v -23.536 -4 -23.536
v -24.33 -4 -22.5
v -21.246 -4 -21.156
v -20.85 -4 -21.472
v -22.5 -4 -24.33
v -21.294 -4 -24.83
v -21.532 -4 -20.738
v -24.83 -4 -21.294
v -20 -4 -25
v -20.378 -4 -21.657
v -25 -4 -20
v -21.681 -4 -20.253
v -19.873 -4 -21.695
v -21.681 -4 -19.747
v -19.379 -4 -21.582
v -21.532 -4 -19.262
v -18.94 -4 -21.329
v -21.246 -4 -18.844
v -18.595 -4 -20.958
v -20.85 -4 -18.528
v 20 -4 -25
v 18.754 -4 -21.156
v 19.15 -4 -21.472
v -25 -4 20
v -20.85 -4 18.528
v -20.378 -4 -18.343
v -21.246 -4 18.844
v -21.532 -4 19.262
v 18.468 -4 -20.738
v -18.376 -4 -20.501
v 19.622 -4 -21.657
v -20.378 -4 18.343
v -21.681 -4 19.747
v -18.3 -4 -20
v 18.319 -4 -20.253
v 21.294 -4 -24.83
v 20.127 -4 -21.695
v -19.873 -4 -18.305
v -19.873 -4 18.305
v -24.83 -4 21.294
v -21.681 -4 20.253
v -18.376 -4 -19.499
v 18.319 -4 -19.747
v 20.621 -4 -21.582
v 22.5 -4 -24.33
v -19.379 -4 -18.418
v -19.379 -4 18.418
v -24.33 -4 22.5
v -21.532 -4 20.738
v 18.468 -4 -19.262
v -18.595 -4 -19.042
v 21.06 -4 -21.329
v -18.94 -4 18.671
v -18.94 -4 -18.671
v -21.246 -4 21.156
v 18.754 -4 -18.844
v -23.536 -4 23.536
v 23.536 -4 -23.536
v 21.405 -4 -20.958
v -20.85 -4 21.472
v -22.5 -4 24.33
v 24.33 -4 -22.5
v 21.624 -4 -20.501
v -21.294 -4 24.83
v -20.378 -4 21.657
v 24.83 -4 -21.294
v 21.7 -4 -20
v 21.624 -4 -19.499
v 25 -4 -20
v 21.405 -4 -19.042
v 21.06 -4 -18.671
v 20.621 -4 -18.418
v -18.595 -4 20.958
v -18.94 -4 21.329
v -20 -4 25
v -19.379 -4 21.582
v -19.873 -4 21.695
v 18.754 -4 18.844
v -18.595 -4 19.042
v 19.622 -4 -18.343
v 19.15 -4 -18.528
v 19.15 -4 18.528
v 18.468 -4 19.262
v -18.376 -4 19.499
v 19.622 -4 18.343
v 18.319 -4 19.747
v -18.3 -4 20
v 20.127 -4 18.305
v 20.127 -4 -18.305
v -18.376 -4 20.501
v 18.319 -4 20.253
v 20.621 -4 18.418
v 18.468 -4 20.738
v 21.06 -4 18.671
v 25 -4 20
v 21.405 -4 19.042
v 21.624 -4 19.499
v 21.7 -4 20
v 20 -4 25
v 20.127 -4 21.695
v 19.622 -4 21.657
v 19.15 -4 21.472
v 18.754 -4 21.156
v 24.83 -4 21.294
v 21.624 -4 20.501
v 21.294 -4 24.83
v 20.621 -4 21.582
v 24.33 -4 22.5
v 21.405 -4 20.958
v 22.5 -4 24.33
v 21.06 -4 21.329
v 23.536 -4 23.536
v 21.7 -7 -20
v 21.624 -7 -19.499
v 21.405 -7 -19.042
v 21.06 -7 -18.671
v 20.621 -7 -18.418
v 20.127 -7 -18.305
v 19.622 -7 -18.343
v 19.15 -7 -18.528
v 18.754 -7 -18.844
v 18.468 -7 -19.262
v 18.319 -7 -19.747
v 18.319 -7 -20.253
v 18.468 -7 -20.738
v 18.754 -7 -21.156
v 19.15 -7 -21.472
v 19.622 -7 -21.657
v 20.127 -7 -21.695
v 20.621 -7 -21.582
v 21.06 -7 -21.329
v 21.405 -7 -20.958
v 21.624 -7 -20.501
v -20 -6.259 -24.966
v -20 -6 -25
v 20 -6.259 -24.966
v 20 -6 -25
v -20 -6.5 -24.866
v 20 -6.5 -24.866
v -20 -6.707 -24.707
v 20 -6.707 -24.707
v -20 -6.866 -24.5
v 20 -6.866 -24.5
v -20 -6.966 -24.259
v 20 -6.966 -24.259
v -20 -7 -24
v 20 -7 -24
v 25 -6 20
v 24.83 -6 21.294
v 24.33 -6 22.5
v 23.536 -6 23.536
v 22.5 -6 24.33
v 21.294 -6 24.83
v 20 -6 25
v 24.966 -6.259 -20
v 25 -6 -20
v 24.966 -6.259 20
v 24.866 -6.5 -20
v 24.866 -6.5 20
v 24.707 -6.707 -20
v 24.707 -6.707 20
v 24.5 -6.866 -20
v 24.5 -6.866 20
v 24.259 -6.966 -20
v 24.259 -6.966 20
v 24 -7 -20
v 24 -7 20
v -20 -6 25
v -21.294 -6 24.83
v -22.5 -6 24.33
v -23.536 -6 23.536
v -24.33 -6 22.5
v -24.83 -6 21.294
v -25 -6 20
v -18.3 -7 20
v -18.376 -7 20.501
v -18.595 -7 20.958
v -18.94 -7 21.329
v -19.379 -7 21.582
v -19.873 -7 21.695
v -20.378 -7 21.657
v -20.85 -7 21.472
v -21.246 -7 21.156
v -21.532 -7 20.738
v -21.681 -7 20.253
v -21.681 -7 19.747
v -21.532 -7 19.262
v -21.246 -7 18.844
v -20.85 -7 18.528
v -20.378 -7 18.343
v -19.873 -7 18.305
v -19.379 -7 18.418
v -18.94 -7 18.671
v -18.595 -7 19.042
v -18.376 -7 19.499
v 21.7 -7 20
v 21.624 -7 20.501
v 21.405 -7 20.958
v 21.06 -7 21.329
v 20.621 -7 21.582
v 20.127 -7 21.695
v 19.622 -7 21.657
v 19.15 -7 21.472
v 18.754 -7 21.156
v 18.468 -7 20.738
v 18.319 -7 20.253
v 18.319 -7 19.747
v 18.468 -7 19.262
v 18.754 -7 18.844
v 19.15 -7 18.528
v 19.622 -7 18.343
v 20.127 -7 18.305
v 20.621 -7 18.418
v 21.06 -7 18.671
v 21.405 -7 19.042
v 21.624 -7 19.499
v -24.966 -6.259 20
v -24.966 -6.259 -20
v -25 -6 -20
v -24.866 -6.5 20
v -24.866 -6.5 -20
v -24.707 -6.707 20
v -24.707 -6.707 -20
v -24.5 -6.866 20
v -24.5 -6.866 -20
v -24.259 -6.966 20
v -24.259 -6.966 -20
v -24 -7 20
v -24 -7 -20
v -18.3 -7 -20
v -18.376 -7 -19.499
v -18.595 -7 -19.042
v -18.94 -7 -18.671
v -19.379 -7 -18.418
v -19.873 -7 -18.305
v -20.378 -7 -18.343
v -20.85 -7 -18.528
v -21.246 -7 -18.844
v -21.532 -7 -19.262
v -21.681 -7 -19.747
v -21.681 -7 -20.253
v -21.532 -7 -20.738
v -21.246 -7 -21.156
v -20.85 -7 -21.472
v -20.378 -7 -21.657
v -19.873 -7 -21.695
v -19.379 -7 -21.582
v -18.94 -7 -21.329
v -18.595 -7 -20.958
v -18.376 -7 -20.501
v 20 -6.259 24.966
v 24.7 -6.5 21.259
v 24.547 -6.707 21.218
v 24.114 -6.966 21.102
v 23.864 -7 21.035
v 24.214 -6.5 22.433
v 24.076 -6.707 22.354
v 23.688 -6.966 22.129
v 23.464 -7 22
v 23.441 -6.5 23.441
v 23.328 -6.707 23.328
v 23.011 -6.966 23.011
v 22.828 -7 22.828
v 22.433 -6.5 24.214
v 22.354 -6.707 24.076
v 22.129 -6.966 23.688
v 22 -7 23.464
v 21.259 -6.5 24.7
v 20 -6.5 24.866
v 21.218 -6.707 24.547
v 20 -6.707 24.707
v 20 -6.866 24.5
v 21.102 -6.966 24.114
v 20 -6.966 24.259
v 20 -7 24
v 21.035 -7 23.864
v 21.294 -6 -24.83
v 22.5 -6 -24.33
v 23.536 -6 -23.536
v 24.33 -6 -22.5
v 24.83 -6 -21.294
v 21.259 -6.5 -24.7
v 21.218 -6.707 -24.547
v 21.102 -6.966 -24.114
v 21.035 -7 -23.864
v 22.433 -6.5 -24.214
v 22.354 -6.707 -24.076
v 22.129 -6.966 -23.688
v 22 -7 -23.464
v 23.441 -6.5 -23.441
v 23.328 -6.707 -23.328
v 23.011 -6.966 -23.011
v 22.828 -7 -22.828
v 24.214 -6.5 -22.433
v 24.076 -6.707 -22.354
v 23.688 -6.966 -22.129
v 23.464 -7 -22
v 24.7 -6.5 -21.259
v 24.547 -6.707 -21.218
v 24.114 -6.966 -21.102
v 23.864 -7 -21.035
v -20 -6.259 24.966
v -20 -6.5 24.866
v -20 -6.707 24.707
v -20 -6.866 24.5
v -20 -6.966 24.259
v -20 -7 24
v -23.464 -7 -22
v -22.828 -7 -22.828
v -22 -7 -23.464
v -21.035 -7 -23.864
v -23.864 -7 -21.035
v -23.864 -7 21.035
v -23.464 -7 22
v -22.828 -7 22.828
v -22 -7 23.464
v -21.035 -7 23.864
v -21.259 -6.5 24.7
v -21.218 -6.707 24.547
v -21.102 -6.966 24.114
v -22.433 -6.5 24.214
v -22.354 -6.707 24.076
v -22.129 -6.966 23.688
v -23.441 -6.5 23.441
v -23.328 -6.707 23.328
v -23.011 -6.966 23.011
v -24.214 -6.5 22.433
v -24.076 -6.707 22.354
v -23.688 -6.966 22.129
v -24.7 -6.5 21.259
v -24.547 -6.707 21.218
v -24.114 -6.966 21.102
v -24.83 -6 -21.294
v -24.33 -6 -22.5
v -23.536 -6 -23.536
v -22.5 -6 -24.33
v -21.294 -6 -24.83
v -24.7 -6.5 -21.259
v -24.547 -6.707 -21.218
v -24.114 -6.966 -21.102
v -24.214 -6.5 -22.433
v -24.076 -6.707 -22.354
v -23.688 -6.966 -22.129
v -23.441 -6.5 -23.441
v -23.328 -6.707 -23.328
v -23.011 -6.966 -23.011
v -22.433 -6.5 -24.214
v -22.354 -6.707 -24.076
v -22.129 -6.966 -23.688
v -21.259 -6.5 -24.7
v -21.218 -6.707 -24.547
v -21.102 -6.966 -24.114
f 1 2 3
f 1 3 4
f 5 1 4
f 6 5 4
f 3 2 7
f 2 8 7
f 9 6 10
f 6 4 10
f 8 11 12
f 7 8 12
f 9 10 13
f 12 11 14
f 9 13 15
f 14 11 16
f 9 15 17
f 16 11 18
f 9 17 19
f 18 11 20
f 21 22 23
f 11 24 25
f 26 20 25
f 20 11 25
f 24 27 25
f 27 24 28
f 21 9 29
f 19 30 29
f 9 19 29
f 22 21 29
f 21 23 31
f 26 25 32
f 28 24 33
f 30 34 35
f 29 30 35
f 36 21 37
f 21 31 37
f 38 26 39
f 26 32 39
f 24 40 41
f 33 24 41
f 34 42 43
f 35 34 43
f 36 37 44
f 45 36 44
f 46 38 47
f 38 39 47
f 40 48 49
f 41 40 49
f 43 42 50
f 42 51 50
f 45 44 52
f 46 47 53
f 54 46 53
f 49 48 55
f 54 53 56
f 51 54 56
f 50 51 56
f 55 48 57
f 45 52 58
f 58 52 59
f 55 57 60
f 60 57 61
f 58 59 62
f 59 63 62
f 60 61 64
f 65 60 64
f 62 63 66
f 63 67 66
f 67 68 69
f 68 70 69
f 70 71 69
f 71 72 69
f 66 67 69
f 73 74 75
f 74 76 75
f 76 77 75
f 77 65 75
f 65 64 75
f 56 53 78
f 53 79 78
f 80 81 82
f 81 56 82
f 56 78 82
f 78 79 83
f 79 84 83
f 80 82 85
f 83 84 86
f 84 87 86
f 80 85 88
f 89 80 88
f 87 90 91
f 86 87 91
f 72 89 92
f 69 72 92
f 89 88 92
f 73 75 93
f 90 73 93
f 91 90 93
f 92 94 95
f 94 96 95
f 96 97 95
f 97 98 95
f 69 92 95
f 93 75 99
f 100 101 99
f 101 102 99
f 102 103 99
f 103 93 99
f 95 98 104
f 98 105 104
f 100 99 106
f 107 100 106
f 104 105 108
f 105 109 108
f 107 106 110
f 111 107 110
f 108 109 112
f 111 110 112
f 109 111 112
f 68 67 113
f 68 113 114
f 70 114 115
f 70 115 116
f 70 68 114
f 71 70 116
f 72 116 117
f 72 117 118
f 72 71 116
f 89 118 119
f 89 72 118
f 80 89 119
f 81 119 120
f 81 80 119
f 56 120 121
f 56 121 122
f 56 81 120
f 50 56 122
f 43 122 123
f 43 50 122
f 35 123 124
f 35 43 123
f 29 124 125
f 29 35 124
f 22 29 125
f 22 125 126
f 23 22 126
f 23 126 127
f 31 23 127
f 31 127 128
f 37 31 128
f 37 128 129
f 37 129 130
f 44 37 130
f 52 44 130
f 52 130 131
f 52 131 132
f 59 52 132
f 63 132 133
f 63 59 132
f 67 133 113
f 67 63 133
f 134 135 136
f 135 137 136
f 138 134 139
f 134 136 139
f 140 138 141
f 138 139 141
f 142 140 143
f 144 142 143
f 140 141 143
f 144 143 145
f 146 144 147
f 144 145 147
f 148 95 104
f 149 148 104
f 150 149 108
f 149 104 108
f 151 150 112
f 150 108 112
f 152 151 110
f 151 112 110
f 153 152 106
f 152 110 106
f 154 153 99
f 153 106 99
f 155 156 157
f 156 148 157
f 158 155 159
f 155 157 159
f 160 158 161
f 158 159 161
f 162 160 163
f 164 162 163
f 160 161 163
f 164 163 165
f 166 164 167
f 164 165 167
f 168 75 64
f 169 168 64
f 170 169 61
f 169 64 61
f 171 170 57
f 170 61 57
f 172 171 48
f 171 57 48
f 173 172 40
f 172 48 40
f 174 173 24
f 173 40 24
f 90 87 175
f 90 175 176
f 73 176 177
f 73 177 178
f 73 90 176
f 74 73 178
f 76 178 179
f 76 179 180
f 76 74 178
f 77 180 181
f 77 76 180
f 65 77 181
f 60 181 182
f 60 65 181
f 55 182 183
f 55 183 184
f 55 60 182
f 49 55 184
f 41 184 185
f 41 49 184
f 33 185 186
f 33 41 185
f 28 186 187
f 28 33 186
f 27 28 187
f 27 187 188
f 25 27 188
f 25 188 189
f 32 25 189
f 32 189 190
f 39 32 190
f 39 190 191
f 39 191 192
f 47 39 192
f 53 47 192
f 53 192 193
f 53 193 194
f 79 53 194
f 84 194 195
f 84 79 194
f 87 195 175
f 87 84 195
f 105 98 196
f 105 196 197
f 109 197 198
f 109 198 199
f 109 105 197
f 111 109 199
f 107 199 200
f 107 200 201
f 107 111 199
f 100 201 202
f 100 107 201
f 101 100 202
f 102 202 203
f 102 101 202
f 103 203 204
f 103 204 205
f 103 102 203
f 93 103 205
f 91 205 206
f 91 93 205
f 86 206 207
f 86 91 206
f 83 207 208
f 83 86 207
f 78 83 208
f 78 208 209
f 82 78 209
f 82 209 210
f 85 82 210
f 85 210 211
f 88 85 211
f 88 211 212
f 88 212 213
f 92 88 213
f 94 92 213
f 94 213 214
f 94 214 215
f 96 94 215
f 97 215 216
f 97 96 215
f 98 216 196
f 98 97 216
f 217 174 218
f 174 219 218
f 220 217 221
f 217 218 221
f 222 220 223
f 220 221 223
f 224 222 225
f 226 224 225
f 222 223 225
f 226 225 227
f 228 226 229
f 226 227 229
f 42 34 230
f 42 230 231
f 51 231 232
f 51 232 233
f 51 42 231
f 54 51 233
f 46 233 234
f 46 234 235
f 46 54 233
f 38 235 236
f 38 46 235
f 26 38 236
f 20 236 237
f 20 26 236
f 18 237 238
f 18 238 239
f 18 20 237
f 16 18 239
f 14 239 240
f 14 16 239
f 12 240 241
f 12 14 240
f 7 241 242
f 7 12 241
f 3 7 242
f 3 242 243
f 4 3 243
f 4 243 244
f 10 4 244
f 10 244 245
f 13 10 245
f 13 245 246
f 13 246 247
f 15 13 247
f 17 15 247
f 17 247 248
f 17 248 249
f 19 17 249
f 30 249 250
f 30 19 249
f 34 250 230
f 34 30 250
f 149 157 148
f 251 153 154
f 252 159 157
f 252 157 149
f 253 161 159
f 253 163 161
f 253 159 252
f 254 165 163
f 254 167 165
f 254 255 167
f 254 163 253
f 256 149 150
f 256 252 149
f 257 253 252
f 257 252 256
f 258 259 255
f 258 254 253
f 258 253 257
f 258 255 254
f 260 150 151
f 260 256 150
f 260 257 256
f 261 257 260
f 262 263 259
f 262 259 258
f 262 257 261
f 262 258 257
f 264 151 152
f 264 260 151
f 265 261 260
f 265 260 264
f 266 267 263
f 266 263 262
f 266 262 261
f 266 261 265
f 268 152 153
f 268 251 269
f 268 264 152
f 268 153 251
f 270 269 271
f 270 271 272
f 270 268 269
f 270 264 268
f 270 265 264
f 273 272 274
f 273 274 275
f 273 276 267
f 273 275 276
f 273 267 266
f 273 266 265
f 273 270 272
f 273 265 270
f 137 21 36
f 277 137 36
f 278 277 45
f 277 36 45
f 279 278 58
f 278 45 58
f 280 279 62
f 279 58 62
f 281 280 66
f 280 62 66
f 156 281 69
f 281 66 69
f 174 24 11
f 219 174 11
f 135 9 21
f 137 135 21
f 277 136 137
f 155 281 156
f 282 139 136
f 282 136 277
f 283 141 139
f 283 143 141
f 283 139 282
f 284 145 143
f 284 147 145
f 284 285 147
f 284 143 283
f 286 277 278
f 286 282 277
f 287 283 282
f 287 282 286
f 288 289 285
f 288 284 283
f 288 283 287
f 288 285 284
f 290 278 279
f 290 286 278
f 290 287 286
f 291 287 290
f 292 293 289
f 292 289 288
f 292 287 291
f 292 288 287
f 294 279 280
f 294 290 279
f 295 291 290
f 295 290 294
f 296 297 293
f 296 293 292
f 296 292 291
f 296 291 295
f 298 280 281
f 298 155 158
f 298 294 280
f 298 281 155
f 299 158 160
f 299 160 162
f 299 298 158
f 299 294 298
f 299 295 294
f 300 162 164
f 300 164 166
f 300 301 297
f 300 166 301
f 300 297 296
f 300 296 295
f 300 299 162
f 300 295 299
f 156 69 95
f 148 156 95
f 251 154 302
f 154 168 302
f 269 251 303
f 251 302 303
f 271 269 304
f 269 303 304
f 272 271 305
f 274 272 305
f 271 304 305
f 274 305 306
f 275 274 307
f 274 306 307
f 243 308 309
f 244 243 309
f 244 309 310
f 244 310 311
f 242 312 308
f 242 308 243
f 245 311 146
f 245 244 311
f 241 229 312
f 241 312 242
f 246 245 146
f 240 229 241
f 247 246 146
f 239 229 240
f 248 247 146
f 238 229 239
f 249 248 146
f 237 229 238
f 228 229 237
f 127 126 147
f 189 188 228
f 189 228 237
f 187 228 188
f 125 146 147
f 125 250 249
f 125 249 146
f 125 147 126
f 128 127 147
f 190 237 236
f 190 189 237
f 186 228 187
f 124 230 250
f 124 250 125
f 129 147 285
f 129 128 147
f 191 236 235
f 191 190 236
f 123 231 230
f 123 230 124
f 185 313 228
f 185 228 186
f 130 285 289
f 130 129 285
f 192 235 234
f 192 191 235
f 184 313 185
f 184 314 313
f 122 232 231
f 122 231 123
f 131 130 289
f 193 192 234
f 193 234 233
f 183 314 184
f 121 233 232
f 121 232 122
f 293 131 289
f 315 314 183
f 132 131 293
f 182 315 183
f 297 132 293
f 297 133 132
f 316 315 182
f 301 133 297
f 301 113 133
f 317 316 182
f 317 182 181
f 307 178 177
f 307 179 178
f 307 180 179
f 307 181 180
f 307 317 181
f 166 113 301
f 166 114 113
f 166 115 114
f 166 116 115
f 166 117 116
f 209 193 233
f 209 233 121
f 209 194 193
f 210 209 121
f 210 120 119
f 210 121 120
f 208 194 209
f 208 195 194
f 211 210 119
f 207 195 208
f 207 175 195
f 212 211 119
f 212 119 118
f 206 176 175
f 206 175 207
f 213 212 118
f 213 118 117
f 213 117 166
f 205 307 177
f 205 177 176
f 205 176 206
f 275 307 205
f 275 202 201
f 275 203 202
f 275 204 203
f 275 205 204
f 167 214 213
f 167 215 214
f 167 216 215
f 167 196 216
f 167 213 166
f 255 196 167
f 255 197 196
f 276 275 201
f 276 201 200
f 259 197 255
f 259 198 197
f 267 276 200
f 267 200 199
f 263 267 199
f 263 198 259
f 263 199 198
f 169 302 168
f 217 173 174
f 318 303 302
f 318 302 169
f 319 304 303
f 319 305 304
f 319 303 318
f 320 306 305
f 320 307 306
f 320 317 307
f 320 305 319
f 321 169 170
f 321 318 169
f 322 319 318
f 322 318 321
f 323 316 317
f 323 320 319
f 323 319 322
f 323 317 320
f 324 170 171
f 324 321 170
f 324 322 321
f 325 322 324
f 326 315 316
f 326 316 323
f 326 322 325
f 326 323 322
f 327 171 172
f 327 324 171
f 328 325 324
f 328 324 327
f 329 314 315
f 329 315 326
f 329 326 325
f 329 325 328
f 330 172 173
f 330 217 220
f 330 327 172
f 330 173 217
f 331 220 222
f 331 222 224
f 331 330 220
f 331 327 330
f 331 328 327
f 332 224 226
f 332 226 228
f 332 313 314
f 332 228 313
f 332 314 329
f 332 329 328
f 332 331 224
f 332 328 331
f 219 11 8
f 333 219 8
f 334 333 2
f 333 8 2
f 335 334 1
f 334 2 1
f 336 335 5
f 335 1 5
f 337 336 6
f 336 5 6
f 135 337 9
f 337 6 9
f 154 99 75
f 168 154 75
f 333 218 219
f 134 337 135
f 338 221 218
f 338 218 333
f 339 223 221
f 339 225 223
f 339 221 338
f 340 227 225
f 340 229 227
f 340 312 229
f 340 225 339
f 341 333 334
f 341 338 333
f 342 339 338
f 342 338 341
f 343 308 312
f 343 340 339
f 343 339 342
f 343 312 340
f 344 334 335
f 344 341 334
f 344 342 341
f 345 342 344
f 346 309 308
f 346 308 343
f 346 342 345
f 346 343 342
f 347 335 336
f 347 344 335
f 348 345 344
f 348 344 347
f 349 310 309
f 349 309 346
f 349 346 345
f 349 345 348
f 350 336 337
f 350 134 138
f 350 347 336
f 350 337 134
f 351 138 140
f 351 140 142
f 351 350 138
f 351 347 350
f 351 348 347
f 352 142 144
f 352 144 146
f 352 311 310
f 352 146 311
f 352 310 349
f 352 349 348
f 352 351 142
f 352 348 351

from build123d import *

# Parameters (mm, degrees)
SKETCH1_R           = 1.7
BOSS_EXTRUDE1_DEPTH = 3
FILLET1_R           = 1


with BuildPart() as part:
    # Sketch1 → Boss-Extrude1 (new body)
    with BuildSketch(Plane.XZ.offset(4)):
        with BuildLine():
            Line((-20, -25), (20, -25))
            ThreePointArc((20, -25), (23.535533906, -23.535533906), (25, -20))
            Line((25, -20), (25, 20))
            ThreePointArc((25, 20), (23.535533906, 23.535533906), (20, 25))
            Line((20, 25), (-20, 25))
            ThreePointArc((-20, 25), (-23.535533906, 23.535533906), (-25, 20))
            Line((-25, 20), (-25, -20))
            ThreePointArc((-25, -20), (-23.535533906, -23.535533906), (-20, -25))
        make_face()
        with Locations((-20, 20)):
            Circle(SKETCH1_R, mode=Mode.SUBTRACT)
        with Locations((20, 20)):
            Circle(SKETCH1_R, mode=Mode.SUBTRACT)
        with Locations((-20, -20)):
            Circle(SKETCH1_R, mode=Mode.SUBTRACT)
        with Locations((20, -20)):
            Circle(SKETCH1_R, mode=Mode.SUBTRACT)
    extrude(amount=BOSS_EXTRUDE1_DEPTH)

    # Fillet1
    fillet1_edges = [part.edges().sort_by_distance(p)[0] for p in [
        (23.535533906, -7, -23.535533906),
        (25, -7, 0),
        (23.535533906, -7, 23.535533906),
        (0, -7, 25),
        (-23.535533906, -7, 23.535533906),
        (-25, -7, 0),
        (-23.535533906, -7, -23.535533906),
        (0, -7, -25),
    ]]
    fillet(fillet1_edges, radius=FILLET1_R)


solid = part.part
